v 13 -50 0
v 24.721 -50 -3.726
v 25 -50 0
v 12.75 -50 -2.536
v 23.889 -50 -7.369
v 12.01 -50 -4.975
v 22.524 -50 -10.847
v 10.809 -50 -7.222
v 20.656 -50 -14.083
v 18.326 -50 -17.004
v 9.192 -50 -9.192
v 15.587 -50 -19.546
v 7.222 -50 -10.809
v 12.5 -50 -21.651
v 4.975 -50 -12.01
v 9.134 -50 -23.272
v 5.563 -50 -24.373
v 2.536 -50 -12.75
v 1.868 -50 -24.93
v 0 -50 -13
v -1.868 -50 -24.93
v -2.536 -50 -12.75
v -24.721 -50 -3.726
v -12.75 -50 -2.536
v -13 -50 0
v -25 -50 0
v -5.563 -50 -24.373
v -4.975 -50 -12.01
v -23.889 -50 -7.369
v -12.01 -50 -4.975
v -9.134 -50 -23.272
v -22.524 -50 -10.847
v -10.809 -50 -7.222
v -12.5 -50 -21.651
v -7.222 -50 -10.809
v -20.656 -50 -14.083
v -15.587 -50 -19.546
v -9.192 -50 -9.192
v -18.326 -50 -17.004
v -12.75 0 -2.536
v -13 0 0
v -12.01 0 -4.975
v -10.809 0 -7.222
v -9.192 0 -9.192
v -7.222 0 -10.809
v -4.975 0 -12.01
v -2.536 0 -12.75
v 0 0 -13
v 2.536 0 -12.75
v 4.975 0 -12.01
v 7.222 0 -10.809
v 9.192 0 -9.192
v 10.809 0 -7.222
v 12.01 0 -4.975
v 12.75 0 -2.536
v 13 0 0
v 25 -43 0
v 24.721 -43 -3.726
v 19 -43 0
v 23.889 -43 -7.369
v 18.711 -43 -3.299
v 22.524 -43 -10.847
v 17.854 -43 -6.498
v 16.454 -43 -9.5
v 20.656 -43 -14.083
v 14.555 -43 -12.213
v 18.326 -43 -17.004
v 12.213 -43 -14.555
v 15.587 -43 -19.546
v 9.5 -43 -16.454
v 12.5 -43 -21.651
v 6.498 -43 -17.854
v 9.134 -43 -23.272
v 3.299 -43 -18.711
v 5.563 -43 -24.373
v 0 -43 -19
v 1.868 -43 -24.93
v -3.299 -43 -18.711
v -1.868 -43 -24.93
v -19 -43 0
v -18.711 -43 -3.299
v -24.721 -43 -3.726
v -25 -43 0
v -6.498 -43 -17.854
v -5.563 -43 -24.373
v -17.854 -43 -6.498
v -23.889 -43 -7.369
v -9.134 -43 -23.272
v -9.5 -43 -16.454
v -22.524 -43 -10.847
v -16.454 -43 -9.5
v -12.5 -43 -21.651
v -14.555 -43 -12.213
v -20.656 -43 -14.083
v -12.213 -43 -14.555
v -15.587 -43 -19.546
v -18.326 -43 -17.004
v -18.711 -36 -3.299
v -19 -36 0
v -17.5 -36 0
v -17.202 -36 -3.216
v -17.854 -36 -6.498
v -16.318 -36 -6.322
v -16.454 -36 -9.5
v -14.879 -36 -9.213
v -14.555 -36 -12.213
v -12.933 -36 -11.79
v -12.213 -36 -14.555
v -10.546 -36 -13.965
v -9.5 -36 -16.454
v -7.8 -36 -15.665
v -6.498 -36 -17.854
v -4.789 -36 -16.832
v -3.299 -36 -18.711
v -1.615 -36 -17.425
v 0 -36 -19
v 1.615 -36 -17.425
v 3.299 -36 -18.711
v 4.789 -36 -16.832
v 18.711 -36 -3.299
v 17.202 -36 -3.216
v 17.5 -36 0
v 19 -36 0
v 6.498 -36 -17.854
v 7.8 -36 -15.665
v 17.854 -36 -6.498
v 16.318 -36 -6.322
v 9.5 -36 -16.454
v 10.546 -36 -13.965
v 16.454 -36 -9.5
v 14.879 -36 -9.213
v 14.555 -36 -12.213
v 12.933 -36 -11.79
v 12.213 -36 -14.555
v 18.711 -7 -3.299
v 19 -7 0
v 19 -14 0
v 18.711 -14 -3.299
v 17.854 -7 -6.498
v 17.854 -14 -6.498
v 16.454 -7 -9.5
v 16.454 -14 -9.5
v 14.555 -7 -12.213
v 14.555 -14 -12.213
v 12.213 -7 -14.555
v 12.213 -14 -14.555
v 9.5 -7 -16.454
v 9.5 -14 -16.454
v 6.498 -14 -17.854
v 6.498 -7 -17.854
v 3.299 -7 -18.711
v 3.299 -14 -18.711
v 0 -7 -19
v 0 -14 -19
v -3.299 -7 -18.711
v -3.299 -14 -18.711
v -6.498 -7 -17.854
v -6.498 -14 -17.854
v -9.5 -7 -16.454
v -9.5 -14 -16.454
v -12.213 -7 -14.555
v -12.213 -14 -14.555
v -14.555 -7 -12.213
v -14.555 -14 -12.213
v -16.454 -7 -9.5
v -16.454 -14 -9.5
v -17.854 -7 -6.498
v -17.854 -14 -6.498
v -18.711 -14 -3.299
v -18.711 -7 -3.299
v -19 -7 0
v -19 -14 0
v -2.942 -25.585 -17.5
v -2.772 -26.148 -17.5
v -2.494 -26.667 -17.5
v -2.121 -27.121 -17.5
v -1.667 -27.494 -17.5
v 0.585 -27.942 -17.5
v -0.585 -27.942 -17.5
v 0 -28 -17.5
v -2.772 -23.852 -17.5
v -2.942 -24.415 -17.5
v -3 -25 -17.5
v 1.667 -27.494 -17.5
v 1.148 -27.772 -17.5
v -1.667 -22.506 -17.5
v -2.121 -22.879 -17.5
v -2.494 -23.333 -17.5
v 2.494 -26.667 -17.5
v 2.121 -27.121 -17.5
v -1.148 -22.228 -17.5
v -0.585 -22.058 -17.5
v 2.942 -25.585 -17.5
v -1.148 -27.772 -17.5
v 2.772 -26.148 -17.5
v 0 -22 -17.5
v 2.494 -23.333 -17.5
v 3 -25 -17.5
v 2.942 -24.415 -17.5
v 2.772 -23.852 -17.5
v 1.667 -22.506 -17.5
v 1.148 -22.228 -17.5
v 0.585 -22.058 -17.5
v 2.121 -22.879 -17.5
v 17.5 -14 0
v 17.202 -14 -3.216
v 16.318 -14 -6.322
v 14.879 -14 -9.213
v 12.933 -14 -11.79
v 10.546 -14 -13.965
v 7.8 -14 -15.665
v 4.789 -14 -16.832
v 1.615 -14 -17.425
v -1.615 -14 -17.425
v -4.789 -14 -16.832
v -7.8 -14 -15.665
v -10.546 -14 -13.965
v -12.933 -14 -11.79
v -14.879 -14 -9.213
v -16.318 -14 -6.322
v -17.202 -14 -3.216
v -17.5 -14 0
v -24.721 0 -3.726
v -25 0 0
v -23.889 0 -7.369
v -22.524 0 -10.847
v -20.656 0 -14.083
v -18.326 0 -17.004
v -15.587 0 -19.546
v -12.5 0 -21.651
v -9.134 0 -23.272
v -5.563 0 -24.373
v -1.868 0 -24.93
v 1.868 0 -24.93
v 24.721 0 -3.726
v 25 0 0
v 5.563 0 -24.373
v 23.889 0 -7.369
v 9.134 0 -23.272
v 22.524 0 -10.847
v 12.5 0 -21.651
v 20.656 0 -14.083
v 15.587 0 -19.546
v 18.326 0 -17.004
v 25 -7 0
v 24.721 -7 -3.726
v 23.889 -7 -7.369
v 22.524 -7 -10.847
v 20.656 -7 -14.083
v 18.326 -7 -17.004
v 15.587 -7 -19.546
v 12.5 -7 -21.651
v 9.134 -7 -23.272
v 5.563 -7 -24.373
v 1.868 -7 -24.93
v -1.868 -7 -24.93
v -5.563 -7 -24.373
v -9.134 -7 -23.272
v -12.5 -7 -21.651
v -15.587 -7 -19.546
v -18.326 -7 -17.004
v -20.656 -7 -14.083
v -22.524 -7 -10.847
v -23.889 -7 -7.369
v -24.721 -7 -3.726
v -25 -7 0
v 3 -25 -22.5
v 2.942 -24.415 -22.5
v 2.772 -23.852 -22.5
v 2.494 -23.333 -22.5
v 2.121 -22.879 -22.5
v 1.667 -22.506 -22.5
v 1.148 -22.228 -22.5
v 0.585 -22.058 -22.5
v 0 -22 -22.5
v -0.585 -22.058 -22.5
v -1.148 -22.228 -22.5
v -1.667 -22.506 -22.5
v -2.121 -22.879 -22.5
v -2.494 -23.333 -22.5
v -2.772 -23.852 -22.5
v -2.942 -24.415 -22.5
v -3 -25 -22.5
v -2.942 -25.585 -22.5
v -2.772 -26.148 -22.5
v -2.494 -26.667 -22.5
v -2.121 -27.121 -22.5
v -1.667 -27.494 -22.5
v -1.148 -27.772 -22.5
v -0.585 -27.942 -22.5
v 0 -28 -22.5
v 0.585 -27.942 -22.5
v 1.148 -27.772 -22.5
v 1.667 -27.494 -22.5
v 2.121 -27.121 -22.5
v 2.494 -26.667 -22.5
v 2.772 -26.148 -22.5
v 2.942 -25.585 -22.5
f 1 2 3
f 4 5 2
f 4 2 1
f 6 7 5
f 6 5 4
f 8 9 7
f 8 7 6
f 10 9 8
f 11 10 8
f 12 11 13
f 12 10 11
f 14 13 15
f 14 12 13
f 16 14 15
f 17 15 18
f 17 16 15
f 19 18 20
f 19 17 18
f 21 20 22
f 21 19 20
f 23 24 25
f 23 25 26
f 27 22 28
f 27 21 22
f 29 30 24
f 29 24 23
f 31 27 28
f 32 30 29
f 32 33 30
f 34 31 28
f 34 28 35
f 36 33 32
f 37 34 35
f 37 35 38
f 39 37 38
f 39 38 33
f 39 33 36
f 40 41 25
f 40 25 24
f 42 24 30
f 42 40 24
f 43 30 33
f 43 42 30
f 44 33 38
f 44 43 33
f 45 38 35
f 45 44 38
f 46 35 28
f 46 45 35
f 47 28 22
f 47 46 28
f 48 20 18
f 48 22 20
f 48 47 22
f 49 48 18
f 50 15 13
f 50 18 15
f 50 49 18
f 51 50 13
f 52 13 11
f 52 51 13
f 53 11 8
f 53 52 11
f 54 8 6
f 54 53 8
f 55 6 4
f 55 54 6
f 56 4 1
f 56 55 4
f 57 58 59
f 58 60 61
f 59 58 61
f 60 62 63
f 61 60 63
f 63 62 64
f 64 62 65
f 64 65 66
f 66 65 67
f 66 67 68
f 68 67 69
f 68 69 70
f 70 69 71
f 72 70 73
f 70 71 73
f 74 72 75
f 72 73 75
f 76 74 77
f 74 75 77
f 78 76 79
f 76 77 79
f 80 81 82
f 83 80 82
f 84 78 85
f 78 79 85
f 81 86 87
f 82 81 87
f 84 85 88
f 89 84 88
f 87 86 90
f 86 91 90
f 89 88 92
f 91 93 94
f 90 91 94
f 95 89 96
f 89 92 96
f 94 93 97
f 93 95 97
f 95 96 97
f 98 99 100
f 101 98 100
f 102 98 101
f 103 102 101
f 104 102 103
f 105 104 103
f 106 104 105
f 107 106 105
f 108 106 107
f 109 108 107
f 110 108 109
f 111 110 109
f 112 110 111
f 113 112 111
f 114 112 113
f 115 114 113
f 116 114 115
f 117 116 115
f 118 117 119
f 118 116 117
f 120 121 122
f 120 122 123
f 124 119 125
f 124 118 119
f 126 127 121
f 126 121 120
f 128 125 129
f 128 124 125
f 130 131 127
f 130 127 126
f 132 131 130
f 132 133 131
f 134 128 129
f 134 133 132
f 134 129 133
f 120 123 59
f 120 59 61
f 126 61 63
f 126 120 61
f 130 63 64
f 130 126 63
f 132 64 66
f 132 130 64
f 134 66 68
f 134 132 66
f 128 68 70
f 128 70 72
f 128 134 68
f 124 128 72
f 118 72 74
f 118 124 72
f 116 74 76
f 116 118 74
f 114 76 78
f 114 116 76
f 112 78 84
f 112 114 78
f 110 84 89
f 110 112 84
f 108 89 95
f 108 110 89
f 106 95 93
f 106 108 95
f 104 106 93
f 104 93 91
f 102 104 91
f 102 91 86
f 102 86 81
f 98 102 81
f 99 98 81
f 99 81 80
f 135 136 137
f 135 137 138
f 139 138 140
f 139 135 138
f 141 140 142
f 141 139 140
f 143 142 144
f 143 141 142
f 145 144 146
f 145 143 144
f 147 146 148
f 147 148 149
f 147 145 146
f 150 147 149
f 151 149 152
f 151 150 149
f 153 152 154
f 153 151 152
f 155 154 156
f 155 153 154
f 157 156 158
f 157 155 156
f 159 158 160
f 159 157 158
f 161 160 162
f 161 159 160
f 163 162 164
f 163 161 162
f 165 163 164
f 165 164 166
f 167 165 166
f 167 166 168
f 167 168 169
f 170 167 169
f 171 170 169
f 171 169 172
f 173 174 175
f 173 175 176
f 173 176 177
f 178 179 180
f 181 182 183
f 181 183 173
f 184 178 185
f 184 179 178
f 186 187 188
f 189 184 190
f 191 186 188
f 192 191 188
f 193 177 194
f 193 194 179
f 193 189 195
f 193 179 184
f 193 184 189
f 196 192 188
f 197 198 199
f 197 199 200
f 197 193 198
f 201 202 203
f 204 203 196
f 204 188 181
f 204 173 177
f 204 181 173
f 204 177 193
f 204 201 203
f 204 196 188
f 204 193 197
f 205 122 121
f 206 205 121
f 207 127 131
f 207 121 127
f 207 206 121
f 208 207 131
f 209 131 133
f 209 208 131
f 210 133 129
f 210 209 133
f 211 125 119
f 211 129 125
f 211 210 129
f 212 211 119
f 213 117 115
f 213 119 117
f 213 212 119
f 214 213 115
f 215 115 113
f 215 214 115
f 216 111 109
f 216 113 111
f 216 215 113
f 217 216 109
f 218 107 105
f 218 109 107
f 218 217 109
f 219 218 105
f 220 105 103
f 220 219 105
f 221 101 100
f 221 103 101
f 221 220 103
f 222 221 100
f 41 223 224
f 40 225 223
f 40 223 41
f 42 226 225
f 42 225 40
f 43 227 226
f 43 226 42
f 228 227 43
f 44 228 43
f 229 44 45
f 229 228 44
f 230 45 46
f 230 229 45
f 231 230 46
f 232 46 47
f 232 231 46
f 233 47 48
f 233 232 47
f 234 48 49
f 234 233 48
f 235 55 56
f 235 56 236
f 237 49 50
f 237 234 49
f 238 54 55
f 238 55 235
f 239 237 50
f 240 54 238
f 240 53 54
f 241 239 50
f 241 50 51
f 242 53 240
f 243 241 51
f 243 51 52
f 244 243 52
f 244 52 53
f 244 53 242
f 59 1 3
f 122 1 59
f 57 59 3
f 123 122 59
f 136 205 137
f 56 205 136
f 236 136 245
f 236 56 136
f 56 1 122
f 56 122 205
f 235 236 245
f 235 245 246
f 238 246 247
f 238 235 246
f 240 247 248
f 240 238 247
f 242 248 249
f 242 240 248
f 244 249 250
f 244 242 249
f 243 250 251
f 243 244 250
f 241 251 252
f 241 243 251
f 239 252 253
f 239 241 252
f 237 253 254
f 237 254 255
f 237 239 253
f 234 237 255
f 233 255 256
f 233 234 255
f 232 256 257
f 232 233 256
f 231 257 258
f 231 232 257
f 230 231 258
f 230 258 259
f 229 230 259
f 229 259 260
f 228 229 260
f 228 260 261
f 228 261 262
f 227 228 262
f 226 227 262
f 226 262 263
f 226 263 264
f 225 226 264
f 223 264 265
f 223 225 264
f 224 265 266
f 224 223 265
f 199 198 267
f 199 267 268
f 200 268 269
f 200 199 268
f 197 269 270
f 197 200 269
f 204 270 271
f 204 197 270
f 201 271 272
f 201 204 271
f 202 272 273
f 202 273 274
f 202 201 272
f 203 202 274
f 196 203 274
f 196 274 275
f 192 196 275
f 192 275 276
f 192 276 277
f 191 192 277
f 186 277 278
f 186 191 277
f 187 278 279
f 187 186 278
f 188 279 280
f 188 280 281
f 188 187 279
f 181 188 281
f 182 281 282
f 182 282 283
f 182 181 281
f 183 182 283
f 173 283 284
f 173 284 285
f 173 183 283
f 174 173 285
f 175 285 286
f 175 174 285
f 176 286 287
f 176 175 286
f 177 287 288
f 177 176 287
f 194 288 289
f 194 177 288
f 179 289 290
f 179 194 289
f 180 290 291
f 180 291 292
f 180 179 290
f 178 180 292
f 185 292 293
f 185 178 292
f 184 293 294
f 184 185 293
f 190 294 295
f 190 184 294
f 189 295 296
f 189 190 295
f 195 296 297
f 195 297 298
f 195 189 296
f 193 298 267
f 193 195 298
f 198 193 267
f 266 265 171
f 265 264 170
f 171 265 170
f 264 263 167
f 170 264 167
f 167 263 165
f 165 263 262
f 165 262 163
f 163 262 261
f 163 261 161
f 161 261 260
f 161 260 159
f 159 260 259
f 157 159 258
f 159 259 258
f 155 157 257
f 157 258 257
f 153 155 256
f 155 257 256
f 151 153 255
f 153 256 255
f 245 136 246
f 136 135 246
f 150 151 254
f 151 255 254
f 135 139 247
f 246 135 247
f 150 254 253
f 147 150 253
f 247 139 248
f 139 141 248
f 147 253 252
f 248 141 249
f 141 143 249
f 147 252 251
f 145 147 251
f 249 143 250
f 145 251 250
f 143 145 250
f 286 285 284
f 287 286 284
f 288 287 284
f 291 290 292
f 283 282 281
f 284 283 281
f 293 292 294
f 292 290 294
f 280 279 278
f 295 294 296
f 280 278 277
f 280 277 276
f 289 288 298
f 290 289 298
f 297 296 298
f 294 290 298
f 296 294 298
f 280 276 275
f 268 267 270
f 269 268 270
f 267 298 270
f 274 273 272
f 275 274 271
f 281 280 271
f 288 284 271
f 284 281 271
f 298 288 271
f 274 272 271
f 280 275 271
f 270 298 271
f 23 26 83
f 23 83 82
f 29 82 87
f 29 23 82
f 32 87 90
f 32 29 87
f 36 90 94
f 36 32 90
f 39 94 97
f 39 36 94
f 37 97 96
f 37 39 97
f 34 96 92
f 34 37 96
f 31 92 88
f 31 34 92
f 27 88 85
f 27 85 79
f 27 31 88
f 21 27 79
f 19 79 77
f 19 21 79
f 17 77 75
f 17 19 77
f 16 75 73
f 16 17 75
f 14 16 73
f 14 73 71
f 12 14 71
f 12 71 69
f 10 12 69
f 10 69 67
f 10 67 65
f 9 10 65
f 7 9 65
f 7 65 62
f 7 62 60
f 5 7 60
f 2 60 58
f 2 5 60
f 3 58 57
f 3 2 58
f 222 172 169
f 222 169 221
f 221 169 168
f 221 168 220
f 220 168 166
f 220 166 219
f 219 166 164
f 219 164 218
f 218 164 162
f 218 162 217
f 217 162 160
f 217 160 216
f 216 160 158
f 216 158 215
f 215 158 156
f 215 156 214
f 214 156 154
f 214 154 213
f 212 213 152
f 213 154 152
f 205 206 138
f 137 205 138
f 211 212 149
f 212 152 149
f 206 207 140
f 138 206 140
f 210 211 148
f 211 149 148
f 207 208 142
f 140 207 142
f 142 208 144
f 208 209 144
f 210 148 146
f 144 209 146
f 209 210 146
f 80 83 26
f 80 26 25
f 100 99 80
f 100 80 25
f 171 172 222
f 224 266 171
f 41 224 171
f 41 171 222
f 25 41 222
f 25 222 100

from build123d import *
from build123d.topology import SkipClean

# Parameters (mm, degrees)
BOSS_EXTRUDE2_DEPTH  = 7
BOSS_EXTRUDE3_DEPTH  = 7
BOSS_EXTRUDE4_DEPTH  = 18
SKETCH7_R            = 13
CUT_EXTRUDE3_DEPTH   = 18
BOSS_EXTRUDE7_DEPTH  = 7
BOSS_EXTRUDE9_START  = 18
BOSS_EXTRUDE9_DEPTH  = 18
BOSS_EXTRUDE10_START = 7
BOSS_EXTRUDE10_DEPTH = 7
SKETCH19_R           = 3
BOSS_EXTRUDE11_DEPTH = 5


with BuildPart() as part:
    # Sketch2 → Boss-Extrude2 (new body)
    with BuildSketch(Plane(origin=(0, 0, 0), x_dir=(1, 0, 0), z_dir=(0, 1, 0))):
        with BuildLine():
            ThreePointArc((25, 0), (0, 25), (-25, 0))
            Line((-25, 0), (-13, 0))
            ThreePointArc((-13, 0), (0, 13), (13, 0))
            Line((13, 0), (25, 0))
        make_face()
    extrude(amount=-BOSS_EXTRUDE2_DEPTH)

    # Sketch5 → Boss-Extrude3 (add)
    with BuildSketch(Plane(origin=(0, -7, 0), x_dir=(1, 0, 0), z_dir=(0, 1, 0))):
        with BuildLine():
            ThreePointArc((19, 0), (0, 19), (-19, 0))
            Line((-19, 0), (-17.5, 0))
            ThreePointArc((-17.5, 0), (0, 17.5), (17.5, 0))
            Line((17.5, 0), (19, 0))
        make_face()
    extrude(amount=-BOSS_EXTRUDE3_DEPTH)

    # Sketch6 → Boss-Extrude4 (add)
    with BuildSketch(Plane(origin=(0, -7, 0), x_dir=(1, 0, 0), z_dir=(0, 1, 0))):
        with BuildLine():
            Line((-17.5, 0), (17.5, 0))
            ThreePointArc((17.5, 0), (0, 17.5), (-17.5, 0))
        make_face()
    extrude(amount=-BOSS_EXTRUDE4_DEPTH)

    # Sketch7 → Cut-Extrude3 (cut)
    with SkipClean():  # the faces are left unmerged after this step: merging them gives an invalid solid
        with BuildSketch(Plane(origin=(0, -7, 0), x_dir=(1, 0, 0), z_dir=(0, 1, 0))):
            Circle(SKETCH7_R)
        extrude(amount=-CUT_EXTRUDE3_DEPTH, mode=Mode.SUBTRACT)
    add(part.part.scale(1), mode=Mode.REPLACE)  # the faces are merged on a copy



with BuildPart() as body_2:
    # Sketch15 → Boss-Extrude7 (new body)
    with BuildSketch(Plane(origin=(0, -50, 0), x_dir=(-1, 0, 0), z_dir=(0, -1, 0))):
        with BuildLine():
            ThreePointArc((25, 0), (0, 25), (-25, 0))
            Line((-25, 0), (-13, 0))
            ThreePointArc((-13, 0), (0, 13), (13, 0))
            Line((13, 0), (25, 0))
        make_face()
    extrude(amount=-BOSS_EXTRUDE7_DEPTH)


with BuildPart() as part_1:
    add(part.part)

    add(body_2.part)  # Boss-Extrude9 merges body 2
    # Sketch16 → Boss-Extrude9 (add)
    with BuildSketch(Plane(origin=(0, -43, 0), x_dir=(1, 0, 0), z_dir=(0, 1, 0)).offset(BOSS_EXTRUDE9_START)):
        with BuildLine():
            ThreePointArc((17.5, 0), (0, 17.5), (-17.5, 0))
            Line((-17.5, 0), (-13, 0))
            ThreePointArc((-13, 0), (0, 13), (13, 0))
            Line((13, 0), (17.5, 0))
        make_face()
    extrude(amount=-BOSS_EXTRUDE9_DEPTH)

    # Sketch18 → Boss-Extrude10 (add)
    with BuildSketch(Plane(origin=(0, -43, 0), x_dir=(1, 0, 0), z_dir=(0, 1, 0)).offset(BOSS_EXTRUDE10_START)):
        with BuildLine():
            ThreePointArc((19, 0), (0, 19), (-19, 0))
            Line((-19, 0), (-17.5, 0))
            ThreePointArc((-17.5, 0), (0, 17.5), (17.5, 0))
            Line((17.5, 0), (19, 0))
        make_face()
    extrude(amount=-BOSS_EXTRUDE10_DEPTH)


with BuildPart() as body_2_2:
    # Sketch19 → Boss-Extrude11 (new body)
    with BuildSketch(Plane.XY.offset(-17.5)):
        with Locations((0, -25)):
            Circle(SKETCH19_R)
    extrude(amount=-BOSS_EXTRUDE11_DEPTH)


solid = Compound([part_1.part, body_2_2.part])
